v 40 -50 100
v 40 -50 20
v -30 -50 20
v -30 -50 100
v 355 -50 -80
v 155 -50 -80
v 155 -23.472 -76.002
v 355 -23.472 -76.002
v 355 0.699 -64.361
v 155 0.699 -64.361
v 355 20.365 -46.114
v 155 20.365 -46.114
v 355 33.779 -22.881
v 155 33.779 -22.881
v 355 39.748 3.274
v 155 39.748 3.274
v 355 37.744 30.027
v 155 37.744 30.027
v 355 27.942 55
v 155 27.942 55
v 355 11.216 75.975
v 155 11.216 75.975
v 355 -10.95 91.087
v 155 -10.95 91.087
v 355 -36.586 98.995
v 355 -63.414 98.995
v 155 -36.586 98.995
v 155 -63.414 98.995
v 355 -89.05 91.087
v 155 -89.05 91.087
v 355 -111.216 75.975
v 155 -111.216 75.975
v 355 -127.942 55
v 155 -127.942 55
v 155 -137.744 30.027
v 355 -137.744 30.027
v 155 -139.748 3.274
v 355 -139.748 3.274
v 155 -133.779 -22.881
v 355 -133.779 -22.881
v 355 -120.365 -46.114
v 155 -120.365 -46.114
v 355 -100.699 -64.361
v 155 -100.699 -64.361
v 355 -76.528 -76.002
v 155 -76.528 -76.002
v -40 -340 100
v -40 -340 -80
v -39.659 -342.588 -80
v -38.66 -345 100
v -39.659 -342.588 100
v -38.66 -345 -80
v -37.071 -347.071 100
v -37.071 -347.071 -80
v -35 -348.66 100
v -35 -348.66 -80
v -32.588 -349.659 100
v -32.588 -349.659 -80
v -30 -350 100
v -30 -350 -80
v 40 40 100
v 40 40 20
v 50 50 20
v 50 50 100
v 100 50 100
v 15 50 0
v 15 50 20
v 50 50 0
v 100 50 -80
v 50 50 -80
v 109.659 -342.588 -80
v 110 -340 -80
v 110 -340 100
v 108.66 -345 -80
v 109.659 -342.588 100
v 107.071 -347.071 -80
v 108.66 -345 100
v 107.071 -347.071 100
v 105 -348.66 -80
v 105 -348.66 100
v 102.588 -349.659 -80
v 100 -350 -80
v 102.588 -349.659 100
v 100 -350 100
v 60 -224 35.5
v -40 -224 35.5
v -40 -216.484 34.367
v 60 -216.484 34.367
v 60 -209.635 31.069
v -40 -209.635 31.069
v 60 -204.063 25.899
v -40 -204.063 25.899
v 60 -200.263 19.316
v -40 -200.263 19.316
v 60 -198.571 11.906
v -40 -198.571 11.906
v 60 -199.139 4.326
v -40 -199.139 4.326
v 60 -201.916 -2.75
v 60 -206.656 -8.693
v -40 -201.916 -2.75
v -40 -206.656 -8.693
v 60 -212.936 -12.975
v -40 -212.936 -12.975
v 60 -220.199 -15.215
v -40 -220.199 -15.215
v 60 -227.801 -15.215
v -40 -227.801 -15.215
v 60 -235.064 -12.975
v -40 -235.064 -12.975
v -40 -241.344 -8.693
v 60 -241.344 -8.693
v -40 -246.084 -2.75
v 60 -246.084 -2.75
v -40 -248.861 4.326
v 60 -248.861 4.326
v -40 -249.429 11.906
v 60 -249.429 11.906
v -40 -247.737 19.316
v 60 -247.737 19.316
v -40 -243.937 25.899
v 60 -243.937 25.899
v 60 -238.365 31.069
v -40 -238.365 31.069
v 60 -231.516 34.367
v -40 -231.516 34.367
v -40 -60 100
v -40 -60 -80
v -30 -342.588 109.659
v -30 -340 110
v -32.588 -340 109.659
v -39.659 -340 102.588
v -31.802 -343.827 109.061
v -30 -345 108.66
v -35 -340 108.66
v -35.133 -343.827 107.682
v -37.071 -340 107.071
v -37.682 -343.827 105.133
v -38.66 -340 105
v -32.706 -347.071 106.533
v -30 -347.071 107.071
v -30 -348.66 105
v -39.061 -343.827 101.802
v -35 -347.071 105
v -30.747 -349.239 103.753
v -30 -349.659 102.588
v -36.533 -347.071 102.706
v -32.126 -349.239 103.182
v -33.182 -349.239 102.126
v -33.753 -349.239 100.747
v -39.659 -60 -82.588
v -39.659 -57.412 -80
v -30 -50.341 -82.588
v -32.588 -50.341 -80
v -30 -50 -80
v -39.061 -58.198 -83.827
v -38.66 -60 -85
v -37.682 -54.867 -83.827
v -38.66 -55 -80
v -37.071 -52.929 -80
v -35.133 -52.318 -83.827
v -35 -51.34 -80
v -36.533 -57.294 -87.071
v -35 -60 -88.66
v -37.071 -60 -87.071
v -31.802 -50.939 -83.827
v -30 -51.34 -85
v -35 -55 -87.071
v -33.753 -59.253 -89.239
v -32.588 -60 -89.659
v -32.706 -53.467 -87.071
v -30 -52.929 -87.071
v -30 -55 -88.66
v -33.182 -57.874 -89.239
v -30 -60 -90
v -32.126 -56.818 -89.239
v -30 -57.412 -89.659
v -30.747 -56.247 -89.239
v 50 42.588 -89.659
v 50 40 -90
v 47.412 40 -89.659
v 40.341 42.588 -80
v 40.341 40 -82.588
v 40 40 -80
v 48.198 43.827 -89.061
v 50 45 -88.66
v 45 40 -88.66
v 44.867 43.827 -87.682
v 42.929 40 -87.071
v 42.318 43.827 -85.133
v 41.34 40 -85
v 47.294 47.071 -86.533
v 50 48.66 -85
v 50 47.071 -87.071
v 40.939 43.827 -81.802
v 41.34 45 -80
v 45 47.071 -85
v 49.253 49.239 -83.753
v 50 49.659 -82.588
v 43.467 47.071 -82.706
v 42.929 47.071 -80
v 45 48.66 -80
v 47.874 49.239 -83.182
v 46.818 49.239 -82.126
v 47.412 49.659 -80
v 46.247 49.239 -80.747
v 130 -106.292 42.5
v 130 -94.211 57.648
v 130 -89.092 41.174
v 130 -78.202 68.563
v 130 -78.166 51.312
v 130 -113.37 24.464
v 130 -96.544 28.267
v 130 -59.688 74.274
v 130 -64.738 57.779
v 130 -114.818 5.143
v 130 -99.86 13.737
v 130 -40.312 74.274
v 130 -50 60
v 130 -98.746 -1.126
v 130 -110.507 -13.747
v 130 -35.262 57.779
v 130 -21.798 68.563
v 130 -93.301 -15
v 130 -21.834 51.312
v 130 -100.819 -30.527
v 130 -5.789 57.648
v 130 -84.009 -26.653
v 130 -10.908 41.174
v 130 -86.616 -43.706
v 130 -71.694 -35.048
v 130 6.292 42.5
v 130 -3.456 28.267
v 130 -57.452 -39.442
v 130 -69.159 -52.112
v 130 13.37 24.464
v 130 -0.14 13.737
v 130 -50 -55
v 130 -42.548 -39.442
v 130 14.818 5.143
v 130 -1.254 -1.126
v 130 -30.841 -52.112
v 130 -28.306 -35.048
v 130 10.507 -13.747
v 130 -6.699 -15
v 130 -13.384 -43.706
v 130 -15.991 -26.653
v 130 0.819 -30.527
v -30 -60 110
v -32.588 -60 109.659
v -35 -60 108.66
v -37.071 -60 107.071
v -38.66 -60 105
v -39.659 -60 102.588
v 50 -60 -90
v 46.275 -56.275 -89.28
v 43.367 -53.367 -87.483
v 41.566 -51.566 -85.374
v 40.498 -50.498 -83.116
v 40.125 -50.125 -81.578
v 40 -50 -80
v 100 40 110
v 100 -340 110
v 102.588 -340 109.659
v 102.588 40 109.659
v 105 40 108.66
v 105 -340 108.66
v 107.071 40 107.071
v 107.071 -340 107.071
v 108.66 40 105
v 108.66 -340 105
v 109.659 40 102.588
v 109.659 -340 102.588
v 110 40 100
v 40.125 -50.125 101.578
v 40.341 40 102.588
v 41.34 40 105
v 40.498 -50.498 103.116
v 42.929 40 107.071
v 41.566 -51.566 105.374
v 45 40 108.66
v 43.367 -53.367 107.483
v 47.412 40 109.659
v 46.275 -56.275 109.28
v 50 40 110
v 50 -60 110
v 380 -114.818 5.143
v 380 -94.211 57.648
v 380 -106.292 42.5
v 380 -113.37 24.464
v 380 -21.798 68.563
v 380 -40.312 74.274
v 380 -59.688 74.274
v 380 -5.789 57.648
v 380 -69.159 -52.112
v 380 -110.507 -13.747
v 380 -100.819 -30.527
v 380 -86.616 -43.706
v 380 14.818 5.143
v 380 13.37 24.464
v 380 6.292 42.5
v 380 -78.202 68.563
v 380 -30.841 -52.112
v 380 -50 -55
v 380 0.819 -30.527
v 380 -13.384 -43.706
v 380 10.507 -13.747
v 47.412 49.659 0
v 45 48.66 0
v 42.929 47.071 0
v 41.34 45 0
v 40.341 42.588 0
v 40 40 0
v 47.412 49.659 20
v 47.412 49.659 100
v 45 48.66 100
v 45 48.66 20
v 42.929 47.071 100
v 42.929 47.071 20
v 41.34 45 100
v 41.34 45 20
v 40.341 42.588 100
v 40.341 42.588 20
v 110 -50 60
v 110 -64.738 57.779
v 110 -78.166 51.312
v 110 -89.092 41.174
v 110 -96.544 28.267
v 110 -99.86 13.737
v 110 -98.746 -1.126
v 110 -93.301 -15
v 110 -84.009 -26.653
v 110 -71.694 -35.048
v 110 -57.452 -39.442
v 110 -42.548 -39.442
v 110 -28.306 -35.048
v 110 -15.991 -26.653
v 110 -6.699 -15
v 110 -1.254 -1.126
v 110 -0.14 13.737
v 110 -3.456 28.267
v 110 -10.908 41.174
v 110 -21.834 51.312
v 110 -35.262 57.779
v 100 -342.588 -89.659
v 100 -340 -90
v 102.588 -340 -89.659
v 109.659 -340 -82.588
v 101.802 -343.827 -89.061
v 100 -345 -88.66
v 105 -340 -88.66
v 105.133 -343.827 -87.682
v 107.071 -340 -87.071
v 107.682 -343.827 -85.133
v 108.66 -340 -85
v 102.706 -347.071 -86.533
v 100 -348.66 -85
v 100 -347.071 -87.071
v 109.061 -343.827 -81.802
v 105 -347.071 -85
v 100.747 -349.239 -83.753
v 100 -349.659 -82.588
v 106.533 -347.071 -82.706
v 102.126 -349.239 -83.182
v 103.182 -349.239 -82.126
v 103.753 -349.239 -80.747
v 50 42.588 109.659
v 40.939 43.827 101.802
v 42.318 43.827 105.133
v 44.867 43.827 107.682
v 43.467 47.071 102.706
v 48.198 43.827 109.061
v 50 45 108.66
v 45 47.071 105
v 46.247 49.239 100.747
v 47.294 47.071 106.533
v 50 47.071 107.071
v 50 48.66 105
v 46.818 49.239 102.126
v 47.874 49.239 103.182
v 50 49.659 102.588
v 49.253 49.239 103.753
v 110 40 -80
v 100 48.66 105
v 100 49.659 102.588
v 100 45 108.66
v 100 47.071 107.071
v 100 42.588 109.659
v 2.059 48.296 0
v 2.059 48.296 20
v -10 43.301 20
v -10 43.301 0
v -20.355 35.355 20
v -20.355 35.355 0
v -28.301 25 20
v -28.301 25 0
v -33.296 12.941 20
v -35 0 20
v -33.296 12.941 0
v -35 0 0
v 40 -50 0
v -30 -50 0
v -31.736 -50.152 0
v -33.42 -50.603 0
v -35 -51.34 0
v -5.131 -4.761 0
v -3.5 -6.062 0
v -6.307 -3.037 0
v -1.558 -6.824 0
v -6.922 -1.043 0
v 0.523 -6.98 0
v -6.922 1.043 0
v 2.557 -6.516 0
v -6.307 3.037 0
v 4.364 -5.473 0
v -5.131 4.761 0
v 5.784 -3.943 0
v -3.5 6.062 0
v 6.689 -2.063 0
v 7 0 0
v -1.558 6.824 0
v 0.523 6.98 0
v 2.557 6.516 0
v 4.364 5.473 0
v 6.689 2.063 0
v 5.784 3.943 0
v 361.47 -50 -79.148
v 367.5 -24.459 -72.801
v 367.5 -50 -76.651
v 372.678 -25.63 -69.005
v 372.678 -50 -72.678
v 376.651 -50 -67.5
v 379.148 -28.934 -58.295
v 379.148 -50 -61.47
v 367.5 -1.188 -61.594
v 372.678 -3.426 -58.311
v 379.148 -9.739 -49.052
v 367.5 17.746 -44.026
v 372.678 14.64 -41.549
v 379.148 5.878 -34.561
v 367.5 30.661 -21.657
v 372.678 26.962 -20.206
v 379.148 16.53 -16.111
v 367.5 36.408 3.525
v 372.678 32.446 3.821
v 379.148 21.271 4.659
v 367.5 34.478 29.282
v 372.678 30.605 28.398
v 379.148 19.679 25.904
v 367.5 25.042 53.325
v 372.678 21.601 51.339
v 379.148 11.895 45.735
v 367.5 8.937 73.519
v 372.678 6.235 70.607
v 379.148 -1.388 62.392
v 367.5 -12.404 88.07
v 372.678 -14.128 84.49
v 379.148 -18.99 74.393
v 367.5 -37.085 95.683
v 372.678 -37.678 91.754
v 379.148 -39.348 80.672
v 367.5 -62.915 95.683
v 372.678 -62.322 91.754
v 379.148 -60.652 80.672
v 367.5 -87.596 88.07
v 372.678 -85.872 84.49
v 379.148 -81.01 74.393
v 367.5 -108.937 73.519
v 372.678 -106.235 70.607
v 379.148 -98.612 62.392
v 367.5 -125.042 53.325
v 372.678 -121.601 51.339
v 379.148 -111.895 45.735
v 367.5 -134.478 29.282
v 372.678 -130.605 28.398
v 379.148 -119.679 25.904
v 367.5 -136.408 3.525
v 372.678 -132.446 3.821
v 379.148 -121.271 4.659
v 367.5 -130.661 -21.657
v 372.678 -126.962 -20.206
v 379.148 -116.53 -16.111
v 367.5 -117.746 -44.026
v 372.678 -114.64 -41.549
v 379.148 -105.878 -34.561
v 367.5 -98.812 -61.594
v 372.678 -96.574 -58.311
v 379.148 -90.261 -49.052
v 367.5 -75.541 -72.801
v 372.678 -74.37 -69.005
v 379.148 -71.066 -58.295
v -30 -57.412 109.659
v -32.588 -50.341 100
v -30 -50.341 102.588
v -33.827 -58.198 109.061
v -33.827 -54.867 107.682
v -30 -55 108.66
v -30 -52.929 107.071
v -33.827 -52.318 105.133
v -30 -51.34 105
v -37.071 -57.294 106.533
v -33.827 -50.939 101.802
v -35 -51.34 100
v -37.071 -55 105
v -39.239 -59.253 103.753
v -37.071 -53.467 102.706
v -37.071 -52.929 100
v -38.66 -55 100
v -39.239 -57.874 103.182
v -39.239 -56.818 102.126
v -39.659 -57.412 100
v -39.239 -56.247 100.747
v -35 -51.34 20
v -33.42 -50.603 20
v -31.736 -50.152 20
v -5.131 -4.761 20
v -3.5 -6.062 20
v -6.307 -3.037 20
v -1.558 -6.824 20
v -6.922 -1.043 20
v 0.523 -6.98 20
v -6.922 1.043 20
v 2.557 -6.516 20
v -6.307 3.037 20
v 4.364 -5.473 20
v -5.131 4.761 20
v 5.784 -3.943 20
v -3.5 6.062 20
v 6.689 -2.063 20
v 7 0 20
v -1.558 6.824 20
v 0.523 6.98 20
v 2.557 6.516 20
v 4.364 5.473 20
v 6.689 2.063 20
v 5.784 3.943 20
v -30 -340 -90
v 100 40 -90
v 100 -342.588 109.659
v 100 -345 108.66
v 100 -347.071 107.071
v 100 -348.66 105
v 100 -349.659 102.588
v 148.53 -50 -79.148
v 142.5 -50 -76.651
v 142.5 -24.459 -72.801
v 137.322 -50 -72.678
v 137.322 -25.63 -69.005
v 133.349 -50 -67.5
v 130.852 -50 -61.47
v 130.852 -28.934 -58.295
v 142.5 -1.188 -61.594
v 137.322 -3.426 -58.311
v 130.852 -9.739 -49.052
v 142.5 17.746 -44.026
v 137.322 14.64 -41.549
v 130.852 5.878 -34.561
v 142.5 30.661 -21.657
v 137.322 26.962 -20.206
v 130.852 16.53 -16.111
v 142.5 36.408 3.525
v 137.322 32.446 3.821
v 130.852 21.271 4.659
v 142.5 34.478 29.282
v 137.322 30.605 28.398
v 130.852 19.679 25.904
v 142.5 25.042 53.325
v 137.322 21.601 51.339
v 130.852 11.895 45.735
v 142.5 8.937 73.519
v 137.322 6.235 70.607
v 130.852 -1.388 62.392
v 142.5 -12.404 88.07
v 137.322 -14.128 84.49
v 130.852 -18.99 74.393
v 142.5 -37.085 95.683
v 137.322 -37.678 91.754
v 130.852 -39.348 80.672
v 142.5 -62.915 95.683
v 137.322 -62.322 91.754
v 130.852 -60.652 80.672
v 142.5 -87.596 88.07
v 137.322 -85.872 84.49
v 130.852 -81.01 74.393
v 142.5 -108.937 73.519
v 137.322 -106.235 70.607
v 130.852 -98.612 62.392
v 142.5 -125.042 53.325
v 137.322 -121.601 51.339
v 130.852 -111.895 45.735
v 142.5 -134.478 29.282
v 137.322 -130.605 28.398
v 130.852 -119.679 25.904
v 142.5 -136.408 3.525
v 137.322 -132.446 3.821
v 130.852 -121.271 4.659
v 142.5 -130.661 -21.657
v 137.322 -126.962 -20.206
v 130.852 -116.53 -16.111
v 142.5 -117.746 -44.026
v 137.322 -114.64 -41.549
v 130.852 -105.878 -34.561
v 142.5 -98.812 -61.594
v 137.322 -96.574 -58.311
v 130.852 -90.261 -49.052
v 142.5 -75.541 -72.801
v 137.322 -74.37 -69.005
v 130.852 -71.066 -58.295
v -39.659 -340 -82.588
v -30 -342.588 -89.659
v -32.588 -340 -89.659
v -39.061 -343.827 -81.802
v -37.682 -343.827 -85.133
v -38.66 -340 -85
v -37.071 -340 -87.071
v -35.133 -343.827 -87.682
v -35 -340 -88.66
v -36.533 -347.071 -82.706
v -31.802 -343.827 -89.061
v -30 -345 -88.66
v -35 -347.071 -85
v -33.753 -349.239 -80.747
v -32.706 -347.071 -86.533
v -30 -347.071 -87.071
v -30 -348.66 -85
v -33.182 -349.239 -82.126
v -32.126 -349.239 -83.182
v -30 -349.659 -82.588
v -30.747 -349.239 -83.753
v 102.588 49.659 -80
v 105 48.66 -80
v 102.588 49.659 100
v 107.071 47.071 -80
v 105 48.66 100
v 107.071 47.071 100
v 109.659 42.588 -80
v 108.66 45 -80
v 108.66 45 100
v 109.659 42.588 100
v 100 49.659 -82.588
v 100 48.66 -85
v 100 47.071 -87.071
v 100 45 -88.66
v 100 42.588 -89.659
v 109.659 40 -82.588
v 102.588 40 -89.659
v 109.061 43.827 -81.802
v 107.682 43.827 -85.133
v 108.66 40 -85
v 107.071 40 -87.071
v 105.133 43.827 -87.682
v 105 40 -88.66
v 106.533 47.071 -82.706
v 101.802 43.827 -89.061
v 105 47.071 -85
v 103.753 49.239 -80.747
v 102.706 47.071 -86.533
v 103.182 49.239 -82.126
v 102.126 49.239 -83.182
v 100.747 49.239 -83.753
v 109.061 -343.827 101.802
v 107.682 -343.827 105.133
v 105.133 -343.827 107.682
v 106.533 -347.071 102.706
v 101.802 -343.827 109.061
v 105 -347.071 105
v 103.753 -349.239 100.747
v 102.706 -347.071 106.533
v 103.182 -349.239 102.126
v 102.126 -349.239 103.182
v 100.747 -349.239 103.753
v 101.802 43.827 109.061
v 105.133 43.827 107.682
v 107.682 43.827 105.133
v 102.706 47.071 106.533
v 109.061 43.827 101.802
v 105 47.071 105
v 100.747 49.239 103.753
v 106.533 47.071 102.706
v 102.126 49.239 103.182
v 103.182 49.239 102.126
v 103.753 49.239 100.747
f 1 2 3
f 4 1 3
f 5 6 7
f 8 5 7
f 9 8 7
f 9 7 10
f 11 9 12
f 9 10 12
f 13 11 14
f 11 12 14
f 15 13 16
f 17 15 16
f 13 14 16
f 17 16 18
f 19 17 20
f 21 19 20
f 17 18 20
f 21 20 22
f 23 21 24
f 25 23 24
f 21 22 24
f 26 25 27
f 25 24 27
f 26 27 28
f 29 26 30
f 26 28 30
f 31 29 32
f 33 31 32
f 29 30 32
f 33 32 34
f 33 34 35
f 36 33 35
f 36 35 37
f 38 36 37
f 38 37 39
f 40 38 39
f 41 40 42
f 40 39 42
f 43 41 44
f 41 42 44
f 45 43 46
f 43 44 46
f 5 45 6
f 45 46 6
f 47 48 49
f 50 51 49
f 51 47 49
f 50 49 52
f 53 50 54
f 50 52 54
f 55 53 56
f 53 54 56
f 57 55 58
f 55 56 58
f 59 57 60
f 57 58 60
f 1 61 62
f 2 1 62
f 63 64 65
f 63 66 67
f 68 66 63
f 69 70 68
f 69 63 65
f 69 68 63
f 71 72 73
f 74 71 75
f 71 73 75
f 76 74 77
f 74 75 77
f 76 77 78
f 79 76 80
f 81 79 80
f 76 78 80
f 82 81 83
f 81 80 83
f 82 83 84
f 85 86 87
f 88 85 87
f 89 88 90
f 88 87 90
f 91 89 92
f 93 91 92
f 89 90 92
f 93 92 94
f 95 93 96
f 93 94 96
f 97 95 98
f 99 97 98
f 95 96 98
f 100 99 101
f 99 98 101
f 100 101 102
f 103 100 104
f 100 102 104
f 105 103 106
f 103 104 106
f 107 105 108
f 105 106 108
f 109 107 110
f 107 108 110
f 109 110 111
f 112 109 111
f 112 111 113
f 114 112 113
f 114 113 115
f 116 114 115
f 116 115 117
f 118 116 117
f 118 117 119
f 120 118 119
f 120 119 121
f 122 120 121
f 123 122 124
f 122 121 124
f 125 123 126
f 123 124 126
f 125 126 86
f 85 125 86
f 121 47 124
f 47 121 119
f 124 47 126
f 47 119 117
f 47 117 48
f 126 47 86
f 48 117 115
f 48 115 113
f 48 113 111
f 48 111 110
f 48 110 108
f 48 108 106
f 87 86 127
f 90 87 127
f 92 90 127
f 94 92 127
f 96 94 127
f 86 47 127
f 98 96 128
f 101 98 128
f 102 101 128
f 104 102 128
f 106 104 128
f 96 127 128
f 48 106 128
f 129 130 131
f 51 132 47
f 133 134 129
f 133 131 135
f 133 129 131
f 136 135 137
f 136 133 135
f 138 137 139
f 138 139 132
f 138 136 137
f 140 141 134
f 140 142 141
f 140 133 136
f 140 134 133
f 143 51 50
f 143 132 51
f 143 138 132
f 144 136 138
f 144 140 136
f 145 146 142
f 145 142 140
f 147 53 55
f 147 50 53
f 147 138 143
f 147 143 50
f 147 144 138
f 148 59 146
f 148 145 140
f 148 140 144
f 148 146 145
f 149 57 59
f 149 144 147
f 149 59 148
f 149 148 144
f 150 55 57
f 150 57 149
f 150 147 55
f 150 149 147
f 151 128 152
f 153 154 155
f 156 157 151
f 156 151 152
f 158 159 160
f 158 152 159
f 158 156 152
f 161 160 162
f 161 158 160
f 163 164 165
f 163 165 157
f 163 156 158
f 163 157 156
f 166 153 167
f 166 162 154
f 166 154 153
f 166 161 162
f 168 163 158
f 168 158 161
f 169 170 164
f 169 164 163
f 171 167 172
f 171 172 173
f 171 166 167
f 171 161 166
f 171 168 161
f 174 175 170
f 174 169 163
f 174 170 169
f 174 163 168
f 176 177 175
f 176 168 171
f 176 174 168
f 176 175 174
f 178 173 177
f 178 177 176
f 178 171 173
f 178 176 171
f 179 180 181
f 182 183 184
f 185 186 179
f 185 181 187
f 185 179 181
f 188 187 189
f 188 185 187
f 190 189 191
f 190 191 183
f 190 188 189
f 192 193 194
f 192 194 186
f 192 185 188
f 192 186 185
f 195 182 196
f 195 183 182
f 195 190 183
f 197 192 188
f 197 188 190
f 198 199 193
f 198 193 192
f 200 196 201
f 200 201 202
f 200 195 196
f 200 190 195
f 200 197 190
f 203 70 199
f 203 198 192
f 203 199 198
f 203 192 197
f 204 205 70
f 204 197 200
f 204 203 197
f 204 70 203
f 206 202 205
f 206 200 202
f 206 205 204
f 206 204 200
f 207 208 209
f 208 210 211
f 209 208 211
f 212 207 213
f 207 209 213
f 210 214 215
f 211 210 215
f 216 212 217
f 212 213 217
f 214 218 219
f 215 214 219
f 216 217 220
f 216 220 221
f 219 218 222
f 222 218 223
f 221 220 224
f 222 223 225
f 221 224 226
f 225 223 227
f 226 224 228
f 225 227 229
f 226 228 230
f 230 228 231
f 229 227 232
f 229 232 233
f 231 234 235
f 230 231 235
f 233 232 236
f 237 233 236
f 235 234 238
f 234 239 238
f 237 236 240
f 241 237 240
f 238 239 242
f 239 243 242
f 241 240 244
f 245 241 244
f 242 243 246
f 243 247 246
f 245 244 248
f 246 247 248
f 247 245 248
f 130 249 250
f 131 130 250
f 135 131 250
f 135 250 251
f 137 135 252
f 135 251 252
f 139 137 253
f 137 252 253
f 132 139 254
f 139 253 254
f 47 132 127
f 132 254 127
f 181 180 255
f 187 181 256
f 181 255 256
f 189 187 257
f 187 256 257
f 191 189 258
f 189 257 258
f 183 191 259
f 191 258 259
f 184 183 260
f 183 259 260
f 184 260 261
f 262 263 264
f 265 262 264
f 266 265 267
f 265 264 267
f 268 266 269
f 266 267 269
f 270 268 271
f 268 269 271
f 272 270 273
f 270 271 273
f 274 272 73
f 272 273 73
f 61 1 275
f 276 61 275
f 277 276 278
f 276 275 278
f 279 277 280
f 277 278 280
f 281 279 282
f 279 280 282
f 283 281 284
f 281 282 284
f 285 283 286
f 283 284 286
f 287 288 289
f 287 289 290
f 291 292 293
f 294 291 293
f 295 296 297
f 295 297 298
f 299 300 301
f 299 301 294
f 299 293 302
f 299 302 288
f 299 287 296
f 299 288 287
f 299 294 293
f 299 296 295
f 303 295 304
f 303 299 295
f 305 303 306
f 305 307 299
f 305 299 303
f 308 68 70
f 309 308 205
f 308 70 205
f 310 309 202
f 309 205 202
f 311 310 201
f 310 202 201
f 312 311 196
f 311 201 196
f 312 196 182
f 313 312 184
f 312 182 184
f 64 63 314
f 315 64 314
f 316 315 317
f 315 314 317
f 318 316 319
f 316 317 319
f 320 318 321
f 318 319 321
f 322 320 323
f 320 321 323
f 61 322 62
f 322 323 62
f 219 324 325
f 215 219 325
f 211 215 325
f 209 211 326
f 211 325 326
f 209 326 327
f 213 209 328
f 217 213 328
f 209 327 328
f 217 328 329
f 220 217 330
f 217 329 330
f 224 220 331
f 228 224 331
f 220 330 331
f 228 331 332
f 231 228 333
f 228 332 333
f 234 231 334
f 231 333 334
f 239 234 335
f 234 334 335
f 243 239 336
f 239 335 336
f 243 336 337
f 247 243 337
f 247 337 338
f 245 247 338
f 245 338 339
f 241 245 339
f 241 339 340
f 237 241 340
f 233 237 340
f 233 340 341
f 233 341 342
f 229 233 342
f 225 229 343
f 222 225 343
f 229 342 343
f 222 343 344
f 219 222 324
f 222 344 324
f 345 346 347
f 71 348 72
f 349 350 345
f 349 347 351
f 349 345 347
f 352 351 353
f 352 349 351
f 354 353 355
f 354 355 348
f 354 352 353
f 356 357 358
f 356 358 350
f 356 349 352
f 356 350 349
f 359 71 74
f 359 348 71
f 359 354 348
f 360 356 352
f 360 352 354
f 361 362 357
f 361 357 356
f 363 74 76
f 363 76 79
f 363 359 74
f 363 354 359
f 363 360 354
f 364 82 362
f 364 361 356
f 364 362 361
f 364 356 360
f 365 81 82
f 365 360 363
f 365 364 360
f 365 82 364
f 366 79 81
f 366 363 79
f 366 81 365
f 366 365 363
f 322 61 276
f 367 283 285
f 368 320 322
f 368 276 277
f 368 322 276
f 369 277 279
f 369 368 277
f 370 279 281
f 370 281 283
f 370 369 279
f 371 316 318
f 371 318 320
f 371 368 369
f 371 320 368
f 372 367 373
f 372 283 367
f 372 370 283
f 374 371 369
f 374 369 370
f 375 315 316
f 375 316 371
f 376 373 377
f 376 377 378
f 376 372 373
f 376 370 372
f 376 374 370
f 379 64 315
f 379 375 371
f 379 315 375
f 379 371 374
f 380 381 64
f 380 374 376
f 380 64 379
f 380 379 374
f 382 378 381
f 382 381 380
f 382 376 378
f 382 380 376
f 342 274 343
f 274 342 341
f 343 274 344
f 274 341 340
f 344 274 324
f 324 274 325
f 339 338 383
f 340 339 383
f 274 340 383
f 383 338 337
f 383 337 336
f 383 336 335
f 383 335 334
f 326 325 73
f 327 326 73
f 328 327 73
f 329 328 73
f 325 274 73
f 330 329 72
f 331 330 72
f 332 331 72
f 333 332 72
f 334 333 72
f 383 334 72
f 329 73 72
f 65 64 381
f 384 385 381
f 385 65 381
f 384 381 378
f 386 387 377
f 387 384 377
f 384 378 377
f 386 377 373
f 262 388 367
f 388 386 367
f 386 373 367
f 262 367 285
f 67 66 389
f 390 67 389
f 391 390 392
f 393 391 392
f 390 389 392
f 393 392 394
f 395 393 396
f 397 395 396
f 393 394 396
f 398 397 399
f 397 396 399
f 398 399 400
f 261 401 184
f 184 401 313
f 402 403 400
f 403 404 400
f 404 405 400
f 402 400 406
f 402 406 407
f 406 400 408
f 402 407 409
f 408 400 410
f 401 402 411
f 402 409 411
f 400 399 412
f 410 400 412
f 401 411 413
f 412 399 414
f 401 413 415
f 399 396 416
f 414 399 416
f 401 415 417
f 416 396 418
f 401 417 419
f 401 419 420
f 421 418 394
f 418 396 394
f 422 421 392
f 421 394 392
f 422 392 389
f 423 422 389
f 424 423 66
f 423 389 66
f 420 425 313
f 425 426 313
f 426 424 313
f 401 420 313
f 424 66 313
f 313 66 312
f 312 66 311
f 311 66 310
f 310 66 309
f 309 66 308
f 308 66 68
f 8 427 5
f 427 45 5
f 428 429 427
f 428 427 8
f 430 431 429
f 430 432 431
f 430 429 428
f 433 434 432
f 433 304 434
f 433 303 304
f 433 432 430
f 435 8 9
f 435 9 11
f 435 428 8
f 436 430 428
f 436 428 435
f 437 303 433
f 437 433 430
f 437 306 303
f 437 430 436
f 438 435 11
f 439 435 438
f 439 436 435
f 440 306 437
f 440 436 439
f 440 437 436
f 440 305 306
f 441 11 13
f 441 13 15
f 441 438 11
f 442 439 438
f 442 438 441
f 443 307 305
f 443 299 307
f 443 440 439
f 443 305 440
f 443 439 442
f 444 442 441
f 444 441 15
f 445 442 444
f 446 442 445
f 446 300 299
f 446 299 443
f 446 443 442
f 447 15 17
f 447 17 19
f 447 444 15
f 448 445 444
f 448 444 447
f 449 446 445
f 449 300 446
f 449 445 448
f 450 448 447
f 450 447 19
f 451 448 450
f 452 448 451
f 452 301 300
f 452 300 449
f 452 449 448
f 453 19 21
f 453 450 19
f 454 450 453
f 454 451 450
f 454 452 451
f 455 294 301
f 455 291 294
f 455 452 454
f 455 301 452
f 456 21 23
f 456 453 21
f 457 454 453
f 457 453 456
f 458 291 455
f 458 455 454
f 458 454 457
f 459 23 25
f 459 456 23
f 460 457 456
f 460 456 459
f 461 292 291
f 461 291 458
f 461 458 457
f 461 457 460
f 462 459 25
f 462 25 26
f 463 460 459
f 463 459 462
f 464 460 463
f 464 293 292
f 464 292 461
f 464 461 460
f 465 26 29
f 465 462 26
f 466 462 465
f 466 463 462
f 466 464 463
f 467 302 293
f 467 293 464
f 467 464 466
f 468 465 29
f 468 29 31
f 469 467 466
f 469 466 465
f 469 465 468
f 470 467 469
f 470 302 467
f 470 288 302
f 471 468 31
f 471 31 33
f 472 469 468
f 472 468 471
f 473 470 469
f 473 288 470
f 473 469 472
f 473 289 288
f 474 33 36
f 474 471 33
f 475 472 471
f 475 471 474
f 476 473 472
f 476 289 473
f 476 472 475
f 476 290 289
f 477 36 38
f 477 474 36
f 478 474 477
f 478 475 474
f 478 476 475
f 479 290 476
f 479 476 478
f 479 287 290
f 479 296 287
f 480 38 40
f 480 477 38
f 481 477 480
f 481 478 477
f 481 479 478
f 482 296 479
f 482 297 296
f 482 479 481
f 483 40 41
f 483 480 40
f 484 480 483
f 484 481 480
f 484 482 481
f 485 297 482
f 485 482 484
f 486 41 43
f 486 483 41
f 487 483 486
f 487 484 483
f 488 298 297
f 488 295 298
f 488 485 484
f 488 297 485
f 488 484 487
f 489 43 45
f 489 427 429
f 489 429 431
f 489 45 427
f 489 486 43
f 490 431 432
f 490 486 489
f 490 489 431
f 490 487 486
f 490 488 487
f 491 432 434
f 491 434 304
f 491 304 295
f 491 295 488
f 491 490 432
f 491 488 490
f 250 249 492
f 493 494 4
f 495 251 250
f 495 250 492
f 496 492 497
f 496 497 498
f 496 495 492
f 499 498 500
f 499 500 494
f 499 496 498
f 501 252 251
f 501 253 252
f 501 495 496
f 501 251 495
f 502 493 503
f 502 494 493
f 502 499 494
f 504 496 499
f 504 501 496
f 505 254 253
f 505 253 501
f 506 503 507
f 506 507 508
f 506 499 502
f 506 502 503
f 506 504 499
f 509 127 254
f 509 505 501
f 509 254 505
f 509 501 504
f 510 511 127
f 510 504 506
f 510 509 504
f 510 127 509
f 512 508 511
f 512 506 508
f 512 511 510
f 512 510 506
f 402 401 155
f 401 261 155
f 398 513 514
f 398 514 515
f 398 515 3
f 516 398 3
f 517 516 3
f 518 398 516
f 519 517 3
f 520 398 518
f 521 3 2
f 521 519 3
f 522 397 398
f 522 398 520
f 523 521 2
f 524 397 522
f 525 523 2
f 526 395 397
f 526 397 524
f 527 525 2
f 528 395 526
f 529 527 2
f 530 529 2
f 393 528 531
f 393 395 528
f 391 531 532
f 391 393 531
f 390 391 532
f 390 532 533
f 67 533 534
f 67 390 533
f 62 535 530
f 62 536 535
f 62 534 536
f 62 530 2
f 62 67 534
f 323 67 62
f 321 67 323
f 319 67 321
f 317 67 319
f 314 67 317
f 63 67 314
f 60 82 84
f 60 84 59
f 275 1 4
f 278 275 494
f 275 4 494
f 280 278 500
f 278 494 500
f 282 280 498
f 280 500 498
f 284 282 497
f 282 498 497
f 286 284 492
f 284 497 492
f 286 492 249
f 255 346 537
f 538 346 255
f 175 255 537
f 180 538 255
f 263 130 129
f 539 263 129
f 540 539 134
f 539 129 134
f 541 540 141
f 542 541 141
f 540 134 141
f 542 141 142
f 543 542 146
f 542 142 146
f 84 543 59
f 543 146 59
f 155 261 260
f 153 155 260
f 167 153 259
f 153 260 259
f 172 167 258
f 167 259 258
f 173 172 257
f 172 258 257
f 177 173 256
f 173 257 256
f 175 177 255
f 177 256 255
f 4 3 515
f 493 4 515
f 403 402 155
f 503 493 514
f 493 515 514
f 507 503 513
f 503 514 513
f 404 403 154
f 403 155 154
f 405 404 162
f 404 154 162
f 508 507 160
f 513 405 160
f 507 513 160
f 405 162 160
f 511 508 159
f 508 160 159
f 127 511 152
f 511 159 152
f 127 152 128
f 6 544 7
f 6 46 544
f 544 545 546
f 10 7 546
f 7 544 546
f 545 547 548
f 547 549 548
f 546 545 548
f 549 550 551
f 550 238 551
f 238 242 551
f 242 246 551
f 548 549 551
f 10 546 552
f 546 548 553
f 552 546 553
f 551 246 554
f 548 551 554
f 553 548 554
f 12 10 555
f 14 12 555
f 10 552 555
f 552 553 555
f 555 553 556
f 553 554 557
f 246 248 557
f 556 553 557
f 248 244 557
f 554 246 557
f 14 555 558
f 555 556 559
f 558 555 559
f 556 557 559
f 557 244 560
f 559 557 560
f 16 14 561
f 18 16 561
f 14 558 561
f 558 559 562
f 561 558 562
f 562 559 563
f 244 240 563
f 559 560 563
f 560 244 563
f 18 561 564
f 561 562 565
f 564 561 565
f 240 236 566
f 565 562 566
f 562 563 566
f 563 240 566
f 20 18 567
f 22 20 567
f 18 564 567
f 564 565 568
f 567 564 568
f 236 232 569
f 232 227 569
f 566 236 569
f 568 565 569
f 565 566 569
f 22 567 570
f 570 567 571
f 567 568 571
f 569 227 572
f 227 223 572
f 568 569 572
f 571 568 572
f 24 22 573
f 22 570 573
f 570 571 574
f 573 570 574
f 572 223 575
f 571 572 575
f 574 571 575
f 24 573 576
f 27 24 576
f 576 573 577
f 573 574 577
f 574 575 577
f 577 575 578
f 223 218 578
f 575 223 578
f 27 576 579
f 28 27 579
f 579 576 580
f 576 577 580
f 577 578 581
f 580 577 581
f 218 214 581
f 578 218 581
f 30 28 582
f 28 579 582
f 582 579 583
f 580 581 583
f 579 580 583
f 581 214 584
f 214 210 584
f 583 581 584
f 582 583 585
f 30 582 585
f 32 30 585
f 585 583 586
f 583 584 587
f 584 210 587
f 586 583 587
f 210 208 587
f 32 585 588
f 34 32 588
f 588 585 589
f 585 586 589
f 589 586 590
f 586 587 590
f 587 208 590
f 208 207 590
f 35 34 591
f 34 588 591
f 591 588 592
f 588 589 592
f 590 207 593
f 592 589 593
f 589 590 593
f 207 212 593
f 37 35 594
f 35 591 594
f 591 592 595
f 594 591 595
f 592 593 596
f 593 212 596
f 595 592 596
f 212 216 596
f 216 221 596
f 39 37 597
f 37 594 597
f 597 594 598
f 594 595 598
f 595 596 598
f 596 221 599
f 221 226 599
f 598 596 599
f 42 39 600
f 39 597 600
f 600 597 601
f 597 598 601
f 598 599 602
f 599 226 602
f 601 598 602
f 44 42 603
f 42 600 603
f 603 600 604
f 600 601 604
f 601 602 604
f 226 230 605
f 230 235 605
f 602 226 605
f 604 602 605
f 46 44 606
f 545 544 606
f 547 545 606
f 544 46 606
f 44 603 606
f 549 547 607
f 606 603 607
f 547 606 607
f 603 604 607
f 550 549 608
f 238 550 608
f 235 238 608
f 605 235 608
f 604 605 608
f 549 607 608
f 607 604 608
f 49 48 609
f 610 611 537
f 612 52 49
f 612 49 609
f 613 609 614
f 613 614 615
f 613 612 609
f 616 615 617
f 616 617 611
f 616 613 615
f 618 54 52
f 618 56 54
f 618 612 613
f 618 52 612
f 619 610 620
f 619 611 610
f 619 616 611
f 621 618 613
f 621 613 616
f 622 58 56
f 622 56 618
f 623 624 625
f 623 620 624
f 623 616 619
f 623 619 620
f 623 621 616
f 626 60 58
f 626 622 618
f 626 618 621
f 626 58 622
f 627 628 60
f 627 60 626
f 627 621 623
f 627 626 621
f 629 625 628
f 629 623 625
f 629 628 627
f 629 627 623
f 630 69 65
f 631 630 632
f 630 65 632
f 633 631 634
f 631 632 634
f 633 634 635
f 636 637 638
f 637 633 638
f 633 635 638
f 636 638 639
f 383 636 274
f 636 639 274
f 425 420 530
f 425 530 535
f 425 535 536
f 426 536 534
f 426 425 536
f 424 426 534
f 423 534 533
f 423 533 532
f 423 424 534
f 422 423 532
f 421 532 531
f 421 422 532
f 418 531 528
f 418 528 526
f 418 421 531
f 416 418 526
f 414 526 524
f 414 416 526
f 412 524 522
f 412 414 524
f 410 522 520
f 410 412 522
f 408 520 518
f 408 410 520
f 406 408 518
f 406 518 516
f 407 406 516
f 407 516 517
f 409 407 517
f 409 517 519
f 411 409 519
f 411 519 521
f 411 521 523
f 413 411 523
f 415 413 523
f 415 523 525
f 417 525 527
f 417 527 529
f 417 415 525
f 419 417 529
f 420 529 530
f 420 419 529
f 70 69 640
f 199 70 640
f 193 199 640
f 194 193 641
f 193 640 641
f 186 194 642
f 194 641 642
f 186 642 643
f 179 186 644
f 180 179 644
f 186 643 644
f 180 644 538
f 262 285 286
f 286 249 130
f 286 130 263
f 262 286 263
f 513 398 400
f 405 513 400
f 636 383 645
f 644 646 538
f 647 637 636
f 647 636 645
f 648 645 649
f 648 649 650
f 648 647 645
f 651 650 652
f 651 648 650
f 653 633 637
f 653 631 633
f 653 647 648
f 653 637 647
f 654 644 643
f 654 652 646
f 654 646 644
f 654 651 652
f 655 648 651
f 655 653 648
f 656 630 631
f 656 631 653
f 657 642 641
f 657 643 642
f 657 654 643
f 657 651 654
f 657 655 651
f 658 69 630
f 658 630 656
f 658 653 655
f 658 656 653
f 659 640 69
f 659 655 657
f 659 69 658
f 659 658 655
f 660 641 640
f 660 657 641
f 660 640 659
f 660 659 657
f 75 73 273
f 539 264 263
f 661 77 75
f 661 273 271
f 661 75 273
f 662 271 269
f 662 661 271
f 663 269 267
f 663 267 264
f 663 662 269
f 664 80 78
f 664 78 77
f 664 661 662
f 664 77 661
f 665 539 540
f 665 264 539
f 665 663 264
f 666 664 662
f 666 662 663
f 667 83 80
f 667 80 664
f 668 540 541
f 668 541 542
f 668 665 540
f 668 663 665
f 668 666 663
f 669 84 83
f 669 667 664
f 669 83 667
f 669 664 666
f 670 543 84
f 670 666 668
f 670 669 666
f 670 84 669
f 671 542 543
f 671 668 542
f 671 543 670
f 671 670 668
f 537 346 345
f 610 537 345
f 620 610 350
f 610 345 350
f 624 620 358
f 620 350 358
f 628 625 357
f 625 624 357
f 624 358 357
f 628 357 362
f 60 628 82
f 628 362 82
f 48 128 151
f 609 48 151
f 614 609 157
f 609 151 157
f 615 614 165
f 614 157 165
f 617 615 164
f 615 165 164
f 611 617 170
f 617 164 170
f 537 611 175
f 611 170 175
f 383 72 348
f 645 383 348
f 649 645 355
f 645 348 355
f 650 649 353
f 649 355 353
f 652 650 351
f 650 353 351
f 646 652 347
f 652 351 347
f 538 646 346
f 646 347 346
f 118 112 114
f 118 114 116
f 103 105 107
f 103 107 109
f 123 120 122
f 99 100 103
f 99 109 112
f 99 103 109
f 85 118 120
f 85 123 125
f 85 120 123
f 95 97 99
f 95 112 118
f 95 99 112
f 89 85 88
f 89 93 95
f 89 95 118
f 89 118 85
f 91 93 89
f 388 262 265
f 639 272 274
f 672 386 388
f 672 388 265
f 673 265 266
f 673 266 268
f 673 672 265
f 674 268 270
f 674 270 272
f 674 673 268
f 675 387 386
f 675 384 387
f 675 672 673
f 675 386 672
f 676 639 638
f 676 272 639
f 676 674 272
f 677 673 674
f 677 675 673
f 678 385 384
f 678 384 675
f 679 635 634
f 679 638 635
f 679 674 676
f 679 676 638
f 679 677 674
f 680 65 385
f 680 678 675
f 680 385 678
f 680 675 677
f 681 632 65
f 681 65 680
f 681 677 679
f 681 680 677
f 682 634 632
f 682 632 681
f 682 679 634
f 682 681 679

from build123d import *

# Parameters (mm, degrees)
SKETCH_1_R          = 7
EXTRUDE_1_DEPTH     = 20
SKETCH_2_W          = 150
SKETCH_2_H          = 200
EXTRUDE_2_DEPTH     = 300
SKETCH_3_W          = 70
SKETCH_3_H          = 200
EXTRUDE_3_DEPTH     = 100
SKETCH_4_R          = 50
EXTRUDE_4_DEPTH     = 20
SKETCH_5_R          = 90
EXTRUDE_5_DEPTH     = 250
FILLET_1_R          = 25
FILLET_2_R          = 10
SKETCH_6_R          = 25.5
CUT_EXTRUDE_1_DEPTH = 100


with BuildPart() as part:
    # 草图1 → 凸台-拉伸1 (new body)
    with BuildSketch(Plane.XY):
        with BuildLine():
            Line((-35, 0), (-35, -50))
            Line((-35, -50), (40, -50))
            Line((40, -50), (40, 50))
            Line((40, 50), (15, 50))
            ThreePointArc((15, 50), (-20.355339059, 35.355339059), (-35, 0))
        make_face()
        Circle(SKETCH_1_R, mode=Mode.SUBTRACT)
    extrude(amount=EXTRUDE_1_DEPTH)

    # 草图2 → 凸台-拉伸2 (add)
    with BuildSketch(Plane(origin=(0, -50, 0), x_dir=(-1, 0, 0), z_dir=(0, -1, 0))):
        with Locations((-35, -10)):
            Rectangle(SKETCH_2_W, SKETCH_2_H)
    extrude(amount=EXTRUDE_2_DEPTH)

    # 草图3 → 凸台-拉伸3 (add)
    with BuildSketch(Plane(origin=(0, -50, 0), x_dir=(1, 0, 0), z_dir=(0, 1, 0))):
        with Locations((75, -10)):
            Rectangle(SKETCH_3_W, SKETCH_3_H)
    extrude(amount=EXTRUDE_3_DEPTH)

    # 草图4 → 凸台-拉伸4 (add)
    with BuildSketch(Plane(origin=(110, 0, 0), x_dir=(0, 0, -1), z_dir=(1, 0, 0))):
        with Locations(Location((-10, -50, 0), (0, 0, 180))):
            Circle(SKETCH_4_R)
    extrude(amount=EXTRUDE_4_DEPTH)

    # 草图5 → 凸台-拉伸5 (add)
    with BuildSketch(Plane(origin=(130, 0, 0), x_dir=(0, 0, -1), z_dir=(1, 0, 0))):
        with Locations((-10, -50)):
            Circle(SKETCH_5_R)
    extrude(amount=EXTRUDE_5_DEPTH)

    # 圆角1
    fillet_1_edges = [part.edges().sort_by_distance(p)[0] for p in [
        (130, -50, 100),
        (380, -50, 100),
    ]]
    fillet(fillet_1_edges, radius=FILLET_1_R)

    # 圆角2
    # the kernel refuses this fillet: 10 mm, written as the material it takes off along each edge
    with BuildSketch(Plane(origin=(50, 40, 100), x_dir=(-1, 0, 0), z_dir=(0, 1, 0))) as fillet_2_piece_1_section:
        Polygon((0, 0), (FILLET_2_R, 0), (FILLET_2_R, FILLET_2_R), (0, FILLET_2_R), align=None)
    fillet_2_piece_1 = extrude(amount=FILLET_2_R, mode=Mode.PRIVATE)
    fillet_2_piece_1 = fillet_2_piece_1 - Plane(origin=(50, 40, 100), x_dir=(0.7071067811865475, 0, -0.7071067811865477), z_dir=(0, 1, 0)) * Sphere(FILLET_2_R, mode=Mode.PRIVATE)
    add(fillet_2_piece_1, mode=Mode.SUBTRACT)
    with BuildSketch(Plane(origin=(100, 40, 100), x_dir=(1, 0, 0), z_dir=(0, 1, 0))) as fillet_2_piece_2_section:
        Polygon((0, 0), (FILLET_2_R, 0), (FILLET_2_R, -FILLET_2_R), (0, -FILLET_2_R), align=None)
    fillet_2_piece_2 = extrude(amount=FILLET_2_R, mode=Mode.PRIVATE)
    fillet_2_piece_2 = fillet_2_piece_2 - Plane(origin=(100, 40, 100), x_dir=(-0.7071067811865475, 0, -0.7071067811865476), z_dir=(0, 1, 0)) * Sphere(FILLET_2_R, mode=Mode.PRIVATE)
    add(fillet_2_piece_2, mode=Mode.SUBTRACT)
    with BuildSketch(Plane(origin=(-30, -60, -80), x_dir=(-1, 0, 0), z_dir=(0, 0, -1))) as fillet_2_piece_3_section:
        Polygon((0, 0), (FILLET_2_R, 0), (FILLET_2_R, FILLET_2_R), (0, FILLET_2_R), align=None)
    fillet_2_piece_3 = extrude(amount=FILLET_2_R, mode=Mode.PRIVATE)
    fillet_2_piece_3 = fillet_2_piece_3 - Plane(origin=(-30, -60, -80), x_dir=(0.7071067811865475, -0.7071067811865475, 0), z_dir=(0, 0, -1)) * Sphere(FILLET_2_R, mode=Mode.PRIVATE)
    add(fillet_2_piece_3, mode=Mode.SUBTRACT)
    with BuildSketch(Plane(origin=(-30, -60, 100), x_dir=(0, 1, 0), z_dir=(-1, 0, 0))) as fillet_2_piece_4_section:
        Polygon((0, 0), (FILLET_2_R, 0), (FILLET_2_R, -FILLET_2_R), (0, -FILLET_2_R), align=None)
    fillet_2_piece_4 = extrude(amount=FILLET_2_R, mode=Mode.PRIVATE)
    fillet_2_piece_4 = fillet_2_piece_4 - Plane(origin=(-30, -60, 100), x_dir=(0, -0.7071067811865475, -0.7071067811865475), z_dir=(-1, 0, 0)) * Sphere(FILLET_2_R, mode=Mode.PRIVATE)
    add(fillet_2_piece_4, mode=Mode.SUBTRACT)
    with BuildSketch(Plane(origin=(-30, -340, 100), x_dir=(-1, 0, 0), z_dir=(0, -1, 0))) as fillet_2_piece_5_section:
        Polygon((0, 0), (FILLET_2_R, 0), (FILLET_2_R, -FILLET_2_R), (0, -FILLET_2_R), align=None)
    fillet_2_piece_5 = extrude(amount=FILLET_2_R, mode=Mode.PRIVATE)
    fillet_2_piece_5 = fillet_2_piece_5 - Plane(origin=(-30, -340, 100), x_dir=(0.7071067811865475, 0, -0.7071067811865475), z_dir=(0, -1, 0)) * Sphere(FILLET_2_R, mode=Mode.PRIVATE)
    add(fillet_2_piece_5, mode=Mode.SUBTRACT)
    with BuildSketch(Plane(origin=(100, -340, 100), x_dir=(1, 0, 0), z_dir=(0, -1, 0))) as fillet_2_piece_6_section:
        Polygon((0, 0), (FILLET_2_R, 0), (FILLET_2_R, FILLET_2_R), (0, FILLET_2_R), align=None)
    fillet_2_piece_6 = extrude(amount=FILLET_2_R, mode=Mode.PRIVATE)
    fillet_2_piece_6 = fillet_2_piece_6 - Plane(origin=(100, -340, 100), x_dir=(-0.7071067811865475, 0, -0.7071067811865476), z_dir=(0, -1, 0)) * Sphere(FILLET_2_R, mode=Mode.PRIVATE)
    add(fillet_2_piece_6, mode=Mode.SUBTRACT)
    with BuildSketch(Plane(origin=(100, -340, -80), x_dir=(0, 0, -1), z_dir=(0, -1, 0))) as fillet_2_piece_7_section:
        Polygon((0, 0), (FILLET_2_R, 0), (FILLET_2_R, FILLET_2_R), (0, FILLET_2_R), align=None)
    fillet_2_piece_7 = extrude(amount=FILLET_2_R, mode=Mode.PRIVATE)
    fillet_2_piece_7 = fillet_2_piece_7 - Plane(origin=(100, -340, -80), x_dir=(-0.7071067811865475, 0, 0.7071067811865475), z_dir=(0, -1, 0)) * Sphere(FILLET_2_R, mode=Mode.PRIVATE)
    add(fillet_2_piece_7, mode=Mode.SUBTRACT)
    with BuildSketch(Plane(origin=(-30, -340, -80), x_dir=(0, 0, -1), z_dir=(0, -1, 0))) as fillet_2_piece_8_section:
        Polygon((0, 0), (FILLET_2_R, 0), (FILLET_2_R, -FILLET_2_R), (0, -FILLET_2_R), align=None)
    fillet_2_piece_8 = extrude(amount=FILLET_2_R, mode=Mode.PRIVATE)
    fillet_2_piece_8 = fillet_2_piece_8 - Plane(origin=(-30, -340, -80), x_dir=(0.7071067811865475, 0, 0.7071067811865476), z_dir=(0, -1, 0)) * Sphere(FILLET_2_R, mode=Mode.PRIVATE)
    add(fillet_2_piece_8, mode=Mode.SUBTRACT)
    with BuildSketch(Plane(origin=(50, 40, -80), x_dir=(0, 0, -1), z_dir=(0, 1, 0))) as fillet_2_piece_9_section:
        Polygon((0, 0), (FILLET_2_R, 0), (FILLET_2_R, FILLET_2_R), (0, FILLET_2_R), align=None)
    fillet_2_piece_9 = extrude(amount=FILLET_2_R, mode=Mode.PRIVATE)
    fillet_2_piece_9 = fillet_2_piece_9 - Plane(origin=(50, 40, -80), x_dir=(0.7071067811865475, 0, 0.7071067811865475), z_dir=(0, 1, 0)) * Sphere(FILLET_2_R, mode=Mode.PRIVATE)
    add(fillet_2_piece_9, mode=Mode.SUBTRACT)
    with BuildSketch(Plane(origin=(100, 40, -80), x_dir=(0, 0, -1), z_dir=(0, 1, 0))) as fillet_2_piece_10_section:
        Polygon((0, 0), (FILLET_2_R, 0), (FILLET_2_R, -FILLET_2_R), (0, -FILLET_2_R), align=None)
    fillet_2_piece_10 = extrude(amount=FILLET_2_R, mode=Mode.PRIVATE)
    fillet_2_piece_10 = fillet_2_piece_10 - Plane(origin=(100, 40, -80), x_dir=(-0.7071067811865475, 0, 0.7071067811865475), z_dir=(0, 1, 0)) * Sphere(FILLET_2_R, mode=Mode.PRIVATE)
    add(fillet_2_piece_10, mode=Mode.SUBTRACT)
    with BuildSketch(Plane(origin=(50, 50, 110), x_dir=(0, -1, 0), z_dir=(1, 0, 0))) as fillet_2_piece_11:
        with BuildLine():
            CenterArc((FILLET_2_R, FILLET_2_R), FILLET_2_R, 180, 90)
            Line((0, FILLET_2_R), (0, 0))
            Line((0, 0), (FILLET_2_R, 0))
        make_face()
    extrude(amount=50, mode=Mode.SUBTRACT)
    with BuildSketch(Plane(origin=(40, -50, 110), x_dir=(1, 0, 0), z_dir=(0, 1, 0))) as fillet_2_piece_12:
        with BuildLine():
            CenterArc((FILLET_2_R, FILLET_2_R), FILLET_2_R, 180, 90)
            Line((0, FILLET_2_R), (0, 0))
            Line((0, 0), (FILLET_2_R, 0))
        make_face()
    extrude(amount=90, mode=Mode.SUBTRACT)
    with BuildSketch(Plane(origin=(-40, -50, -80), x_dir=(0, -1, 0), z_dir=(0, 0, 1))) as fillet_2_piece_13_section:
        with BuildLine():
            CenterArc((FILLET_2_R, FILLET_2_R), FILLET_2_R, 180, 90)
            Line((0, FILLET_2_R), (0, 0))
            Line((0, 0), (FILLET_2_R, 0))
        make_face()
    fillet_2_piece_13 = extrude(amount=180, mode=Mode.PRIVATE)
    fillet_2_piece_13 = split(fillet_2_piece_13, bisect_by=Plane(origin=(-38.356082357, -52.5512006, 0), z_dir=(0, 0, -1)), keep=Keep.TOP, mode=Mode.PRIVATE)
    fillet_2_piece_13 = split(fillet_2_piece_13, bisect_by=Plane(origin=(-35, -52.5512006, -40), z_dir=(-1, 0, 0)), keep=Keep.TOP, mode=Mode.PRIVATE)
    add(fillet_2_piece_13, mode=Mode.SUBTRACT)
    with BuildSketch(Plane(origin=(-40, -50, -80), x_dir=(0, -1, 0), z_dir=(0, 0, 1))) as fillet_2_piece_14_section:
        with BuildLine():
            CenterArc((FILLET_2_R, FILLET_2_R), FILLET_2_R, 180, 90)
            Line((0, FILLET_2_R), (0, 0))
            Line((0, 0), (FILLET_2_R, 0))
        make_face()
    fillet_2_piece_14 = extrude(amount=180, mode=Mode.PRIVATE)
    fillet_2_piece_14 = split(fillet_2_piece_14, bisect_by=Plane(origin=(-33.367492155, -50.240083817, 0), z_dir=(0, 0, -1)), keep=Keep.TOP, mode=Mode.PRIVATE)
    fillet_2_piece_14 = split(fillet_2_piece_14, bisect_by=Plane(origin=(-35, -50.240083817, -40), z_dir=(1, 0, 0)), keep=Keep.TOP, mode=Mode.PRIVATE)
    add(fillet_2_piece_14, mode=Mode.SUBTRACT)
    with BuildSketch(Plane(origin=(-40, -50, -80), x_dir=(0, -1, 0), z_dir=(0, 0, 1))) as fillet_2_piece_15_section:
        with BuildLine():
            CenterArc((FILLET_2_R, FILLET_2_R), FILLET_2_R, 180, 90)
            Line((0, FILLET_2_R), (0, 0))
            Line((0, 0), (FILLET_2_R, 0))
        make_face()
    fillet_2_piece_15 = extrude(amount=180, mode=Mode.PRIVATE)
    fillet_2_piece_15 = split(fillet_2_piece_15, bisect_by=Plane(origin=(-38.356082357, -52.5512006, 0), z_dir=(0, 0, 1)), keep=Keep.TOP, mode=Mode.PRIVATE)
    fillet_2_piece_15 = split(fillet_2_piece_15, bisect_by=Plane(origin=(-35, -52.5512006, 10), z_dir=(-1, 0, 0)), keep=Keep.TOP, mode=Mode.PRIVATE)
    fillet_2_piece_15 = split(fillet_2_piece_15, bisect_by=Plane(origin=(-38.356082357, -52.5512006, 20), z_dir=(0, 0, -1)), keep=Keep.TOP, mode=Mode.PRIVATE)
    add(fillet_2_piece_15, mode=Mode.SUBTRACT)
    with BuildSketch(Plane(origin=(-40, -50, -80), x_dir=(0, -1, 0), z_dir=(0, 0, 1))) as fillet_2_piece_16_section:
        with BuildLine():
            CenterArc((FILLET_2_R, FILLET_2_R), FILLET_2_R, 180, 90)
            Line((0, FILLET_2_R), (0, 0))
            Line((0, 0), (FILLET_2_R, 0))
        make_face()
    fillet_2_piece_16 = extrude(amount=180, mode=Mode.PRIVATE)
    fillet_2_piece_16 = split(fillet_2_piece_16, bisect_by=Plane(origin=(-35, -52.5512006, 60), z_dir=(-1, 0, 0)), keep=Keep.TOP, mode=Mode.PRIVATE)
    fillet_2_piece_16 = split(fillet_2_piece_16, bisect_by=Plane(origin=(-38.356082357, -52.5512006, 20), z_dir=(0, 0, 1)), keep=Keep.TOP, mode=Mode.PRIVATE)
    add(fillet_2_piece_16, mode=Mode.SUBTRACT)
    with BuildSketch(Plane(origin=(-40, -50, -80), x_dir=(0, -1, 0), z_dir=(0, 0, 1))) as fillet_2_piece_17_section:
        with BuildLine():
            CenterArc((FILLET_2_R, FILLET_2_R), FILLET_2_R, 180, 90)
            Line((0, FILLET_2_R), (0, 0))
            Line((0, 0), (FILLET_2_R, 0))
        make_face()
    fillet_2_piece_17 = extrude(amount=180, mode=Mode.PRIVATE)
    fillet_2_piece_17 = split(fillet_2_piece_17, bisect_by=Plane(origin=(-35, -50.240083817, 60), z_dir=(1, 0, 0)), keep=Keep.TOP, mode=Mode.PRIVATE)
    fillet_2_piece_17 = split(fillet_2_piece_17, bisect_by=Plane(origin=(-33.367492155, -50.240083817, 20), z_dir=(0, 0, 1)), keep=Keep.TOP, mode=Mode.PRIVATE)
    add(fillet_2_piece_17, mode=Mode.SUBTRACT)
    with BuildSketch(Plane(origin=(-40, -60, 110), x_dir=(1, 0, 0), z_dir=(0, -1, 0))) as fillet_2_piece_18:
        with BuildLine():
            CenterArc((FILLET_2_R, -FILLET_2_R), FILLET_2_R, 90, 90)
            Line((0, -FILLET_2_R), (0, 0))
            Line((0, 0), (FILLET_2_R, 0))
        make_face()
    extrude(amount=280, mode=Mode.SUBTRACT)
    with BuildSketch(Plane(origin=(110, -340, 110), x_dir=(0, 0, -1), z_dir=(0, 1, 0))) as fillet_2_piece_19:
        with BuildLine():
            CenterArc((FILLET_2_R, FILLET_2_R), FILLET_2_R, 180, 90)
            Line((0, FILLET_2_R), (0, 0))
            Line((0, 0), (FILLET_2_R, 0))
        make_face()
    extrude(amount=380, mode=Mode.SUBTRACT)
    with BuildSketch(Plane(origin=(110, -350, 100), x_dir=(0, 1, 0), z_dir=(0, 0, -1))) as fillet_2_piece_20:
        with BuildLine():
            CenterArc((FILLET_2_R, -FILLET_2_R), FILLET_2_R, 90, 90)
            Line((0, -FILLET_2_R), (0, 0))
            Line((0, 0), (FILLET_2_R, 0))
        make_face()
    extrude(amount=180, mode=Mode.SUBTRACT)
    with BuildSketch(Plane(origin=(-30, -350, 110), x_dir=(0, 1, 0), z_dir=(1, 0, 0))) as fillet_2_piece_21:
        with BuildLine():
            CenterArc((FILLET_2_R, -FILLET_2_R), FILLET_2_R, 90, 90)
            Line((0, -FILLET_2_R), (0, 0))
            Line((0, 0), (FILLET_2_R, 0))
        make_face()
    extrude(amount=130, mode=Mode.SUBTRACT)
    with BuildSketch(Plane(origin=(-40, -350, -80), x_dir=(1, 0, 0), z_dir=(0, 0, 1)), Plane(origin=(110, 50, 100), x_dir=(0, -1, 0), z_dir=(0, 0, -1))) as fillet_2_piece_22:
        with BuildLine():
            CenterArc((FILLET_2_R, FILLET_2_R), FILLET_2_R, 180, 90)
            Line((0, FILLET_2_R), (0, 0))
            Line((0, 0), (FILLET_2_R, 0))
        make_face()
    extrude(amount=180, mode=Mode.SUBTRACT)
    with BuildSketch(Plane(origin=(40, -50, -90), x_dir=(0, -1, 0), z_dir=(-1, 0, 0)), Plane(origin=(-30, -50, 110), x_dir=(0, -1, 0), z_dir=(1, 0, 0))) as fillet_2_piece_23:
        with BuildLine():
            CenterArc((FILLET_2_R, FILLET_2_R), FILLET_2_R, 180, 90)
            Line((0, FILLET_2_R), (0, 0))
            Line((0, 0), (FILLET_2_R, 0))
        make_face()
    extrude(amount=70, mode=Mode.SUBTRACT)
    with BuildSketch(Plane(origin=(40, -50, -90), x_dir=(1, 0, 0), z_dir=(0, 1, 0))) as fillet_2_piece_24:
        with BuildLine():
            CenterArc((FILLET_2_R, -FILLET_2_R), FILLET_2_R, 90, 90)
            Line((0, -FILLET_2_R), (0, 0))
            Line((0, 0), (FILLET_2_R, 0))
        make_face()
    extrude(amount=90, mode=Mode.SUBTRACT)
    with BuildSketch(Plane(origin=(100, 50, -90), x_dir=(0, 0, 1), z_dir=(-1, 0, 0))) as fillet_2_piece_25:
        with BuildLine():
            CenterArc((FILLET_2_R, -FILLET_2_R), FILLET_2_R, 90, 90)
            Line((0, -FILLET_2_R), (0, 0))
            Line((0, 0), (FILLET_2_R, 0))
        make_face()
    extrude(amount=50, mode=Mode.SUBTRACT)
    with BuildSketch(Plane(origin=(-40, -60, -90), x_dir=(1, 0, 0), z_dir=(0, -1, 0))) as fillet_2_piece_26:
        with BuildLine():
            CenterArc((FILLET_2_R, FILLET_2_R), FILLET_2_R, 180, 90)
            Line((0, FILLET_2_R), (0, 0))
            Line((0, 0), (FILLET_2_R, 0))
        make_face()
    extrude(amount=280, mode=Mode.SUBTRACT)
    with BuildSketch(Plane(origin=(100, -350, -90), x_dir=(0, 0, 1), z_dir=(-1, 0, 0))) as fillet_2_piece_27:
        with BuildLine():
            CenterArc((FILLET_2_R, FILLET_2_R), FILLET_2_R, 180, 90)
            Line((0, FILLET_2_R), (0, 0))
            Line((0, 0), (FILLET_2_R, 0))
        make_face()
    extrude(amount=130, mode=Mode.SUBTRACT)
    with BuildSketch(Plane(origin=(110, -340, -90), x_dir=(0, 0, 1), z_dir=(0, 1, 0))) as fillet_2_piece_28:
        with BuildLine():
            CenterArc((FILLET_2_R, -FILLET_2_R), FILLET_2_R, 90, 90)
            Line((0, -FILLET_2_R), (0, 0))
            Line((0, 0), (FILLET_2_R, 0))
        make_face()
    extrude(amount=380, mode=Mode.SUBTRACT)
    with BuildSketch(Plane(origin=(40, 50, -80), x_dir=(1, 0, 0), z_dir=(0, 0, 1)), Plane(origin=(40, 50, 20), x_dir=(1, 0, 0), z_dir=(0, 0, 1))) as fillet_2_piece_29:
        with BuildLine():
            CenterArc((FILLET_2_R, -FILLET_2_R), FILLET_2_R, 90, 90)
            Line((0, -FILLET_2_R), (0, 0))
            Line((0, 0), (FILLET_2_R, 0))
        make_face()
    extrude(amount=80, mode=Mode.SUBTRACT)
    with BuildSketch(Plane(origin=(40, 50, -80), x_dir=(1, 0, 0), z_dir=(0, 0, 1))) as fillet_2_piece_30_section:
        with BuildLine():
            CenterArc((FILLET_2_R, -FILLET_2_R), FILLET_2_R, 90, 90)
            Line((0, -FILLET_2_R), (0, 0))
            Line((0, 0), (FILLET_2_R, 0))
        make_face()
    fillet_2_piece_30 = extrude(amount=105, mode=Mode.PRIVATE)
    fillet_2_piece_30 = split(fillet_2_piece_30, bisect_by=Plane(origin=(42.263951143, 47.736048857, 20), z_dir=(0, 0, 1)), keep=Keep.TOP, mode=Mode.PRIVATE)
    add(fillet_2_piece_30, mode=Mode.SUBTRACT)
    with BuildSketch(Plane(origin=(40, 50, -5), x_dir=(1, 0, 0), z_dir=(0, 0, 1))) as fillet_2_piece_31_section:
        with BuildLine():
            CenterArc((FILLET_2_R, -FILLET_2_R), FILLET_2_R, 90, 90)
            Line((0, -FILLET_2_R), (0, 0))
            Line((0, 0), (FILLET_2_R, 0))
        make_face()
    fillet_2_piece_31 = extrude(amount=105, mode=Mode.PRIVATE)
    fillet_2_piece_31 = split(fillet_2_piece_31, bisect_by=Plane(origin=(42.263951143, 47.736048857, 0), z_dir=(0, 0, -1)), keep=Keep.TOP, mode=Mode.PRIVATE)
    add(fillet_2_piece_31, mode=Mode.SUBTRACT)
    with BuildSketch(Plane(origin=(40, -75, 110), x_dir=(1, 0, 0), z_dir=(0, 1, 0))) as fillet_2_piece_32a_section:
        with BuildLine():
            CenterArc((FILLET_2_R, FILLET_2_R), FILLET_2_R, 180, 90)
            Line((0, FILLET_2_R), (0, 0))
            Line((0, 0), (FILLET_2_R, 0))
        make_face()
    fillet_2_piece_32a = extrude(amount=115, mode=Mode.PRIVATE)
    fillet_2_piece_32a = split(fillet_2_piece_32a, bisect_by=Plane(origin=(42.263951143, -50, 107.736048857), z_dir=(0, -1, 0)), keep=Keep.TOP, mode=Mode.PRIVATE)
    with BuildSketch(Plane(origin=(-30, -50, 110), x_dir=(0, -1, 0), z_dir=(1, 0, 0))) as fillet_2_piece_32b_section:
        with BuildLine():
            CenterArc((FILLET_2_R, FILLET_2_R), FILLET_2_R, 180, 90)
            Line((0, FILLET_2_R), (0, 0))
            Line((0, 0), (FILLET_2_R, 0))
        make_face()
    fillet_2_piece_32b = extrude(amount=95, mode=Mode.PRIVATE)
    fillet_2_piece_32b = split(fillet_2_piece_32b, bisect_by=Plane(origin=(40, -52.263951143, 107.736048857), z_dir=(1, 0, 0)), keep=Keep.TOP, mode=Mode.PRIVATE)
    fillet_2_piece_32 = fillet_2_piece_32a & fillet_2_piece_32b
    add(fillet_2_piece_32, mode=Mode.SUBTRACT)
    with BuildSketch(Plane(origin=(65, -50, -90), x_dir=(0, -1, 0), z_dir=(-1, 0, 0))) as fillet_2_piece_33a_section:
        with BuildLine():
            CenterArc((FILLET_2_R, FILLET_2_R), FILLET_2_R, 180, 90)
            Line((0, FILLET_2_R), (0, 0))
            Line((0, 0), (FILLET_2_R, 0))
        make_face()
    fillet_2_piece_33a = extrude(amount=95, mode=Mode.PRIVATE)
    fillet_2_piece_33a = split(fillet_2_piece_33a, bisect_by=Plane(origin=(40, -52.263951143, -87.736048857), z_dir=(1, 0, 0)), keep=Keep.TOP, mode=Mode.PRIVATE)
    with BuildSketch(Plane(origin=(40, -75, -90), x_dir=(1, 0, 0), z_dir=(0, 1, 0))) as fillet_2_piece_33b_section:
        with BuildLine():
            CenterArc((FILLET_2_R, -FILLET_2_R), FILLET_2_R, 90, 90)
            Line((0, -FILLET_2_R), (0, 0))
            Line((0, 0), (FILLET_2_R, 0))
        make_face()
    fillet_2_piece_33b = extrude(amount=115, mode=Mode.PRIVATE)
    fillet_2_piece_33b = split(fillet_2_piece_33b, bisect_by=Plane(origin=(42.263951143, -50, -87.736048857), z_dir=(0, -1, 0)), keep=Keep.TOP, mode=Mode.PRIVATE)
    fillet_2_piece_33 = fillet_2_piece_33a & fillet_2_piece_33b
    add(fillet_2_piece_33, mode=Mode.SUBTRACT)

    # 草图6 → 切除-拉伸1 (cut)
    with BuildSketch(Plane.ZY.offset(40)):
        with Locations((10, -224)):
            Circle(SKETCH_6_R)
    extrude(amount=-CUT_EXTRUDE_1_DEPTH, mode=Mode.SUBTRACT)


solid = part.part
